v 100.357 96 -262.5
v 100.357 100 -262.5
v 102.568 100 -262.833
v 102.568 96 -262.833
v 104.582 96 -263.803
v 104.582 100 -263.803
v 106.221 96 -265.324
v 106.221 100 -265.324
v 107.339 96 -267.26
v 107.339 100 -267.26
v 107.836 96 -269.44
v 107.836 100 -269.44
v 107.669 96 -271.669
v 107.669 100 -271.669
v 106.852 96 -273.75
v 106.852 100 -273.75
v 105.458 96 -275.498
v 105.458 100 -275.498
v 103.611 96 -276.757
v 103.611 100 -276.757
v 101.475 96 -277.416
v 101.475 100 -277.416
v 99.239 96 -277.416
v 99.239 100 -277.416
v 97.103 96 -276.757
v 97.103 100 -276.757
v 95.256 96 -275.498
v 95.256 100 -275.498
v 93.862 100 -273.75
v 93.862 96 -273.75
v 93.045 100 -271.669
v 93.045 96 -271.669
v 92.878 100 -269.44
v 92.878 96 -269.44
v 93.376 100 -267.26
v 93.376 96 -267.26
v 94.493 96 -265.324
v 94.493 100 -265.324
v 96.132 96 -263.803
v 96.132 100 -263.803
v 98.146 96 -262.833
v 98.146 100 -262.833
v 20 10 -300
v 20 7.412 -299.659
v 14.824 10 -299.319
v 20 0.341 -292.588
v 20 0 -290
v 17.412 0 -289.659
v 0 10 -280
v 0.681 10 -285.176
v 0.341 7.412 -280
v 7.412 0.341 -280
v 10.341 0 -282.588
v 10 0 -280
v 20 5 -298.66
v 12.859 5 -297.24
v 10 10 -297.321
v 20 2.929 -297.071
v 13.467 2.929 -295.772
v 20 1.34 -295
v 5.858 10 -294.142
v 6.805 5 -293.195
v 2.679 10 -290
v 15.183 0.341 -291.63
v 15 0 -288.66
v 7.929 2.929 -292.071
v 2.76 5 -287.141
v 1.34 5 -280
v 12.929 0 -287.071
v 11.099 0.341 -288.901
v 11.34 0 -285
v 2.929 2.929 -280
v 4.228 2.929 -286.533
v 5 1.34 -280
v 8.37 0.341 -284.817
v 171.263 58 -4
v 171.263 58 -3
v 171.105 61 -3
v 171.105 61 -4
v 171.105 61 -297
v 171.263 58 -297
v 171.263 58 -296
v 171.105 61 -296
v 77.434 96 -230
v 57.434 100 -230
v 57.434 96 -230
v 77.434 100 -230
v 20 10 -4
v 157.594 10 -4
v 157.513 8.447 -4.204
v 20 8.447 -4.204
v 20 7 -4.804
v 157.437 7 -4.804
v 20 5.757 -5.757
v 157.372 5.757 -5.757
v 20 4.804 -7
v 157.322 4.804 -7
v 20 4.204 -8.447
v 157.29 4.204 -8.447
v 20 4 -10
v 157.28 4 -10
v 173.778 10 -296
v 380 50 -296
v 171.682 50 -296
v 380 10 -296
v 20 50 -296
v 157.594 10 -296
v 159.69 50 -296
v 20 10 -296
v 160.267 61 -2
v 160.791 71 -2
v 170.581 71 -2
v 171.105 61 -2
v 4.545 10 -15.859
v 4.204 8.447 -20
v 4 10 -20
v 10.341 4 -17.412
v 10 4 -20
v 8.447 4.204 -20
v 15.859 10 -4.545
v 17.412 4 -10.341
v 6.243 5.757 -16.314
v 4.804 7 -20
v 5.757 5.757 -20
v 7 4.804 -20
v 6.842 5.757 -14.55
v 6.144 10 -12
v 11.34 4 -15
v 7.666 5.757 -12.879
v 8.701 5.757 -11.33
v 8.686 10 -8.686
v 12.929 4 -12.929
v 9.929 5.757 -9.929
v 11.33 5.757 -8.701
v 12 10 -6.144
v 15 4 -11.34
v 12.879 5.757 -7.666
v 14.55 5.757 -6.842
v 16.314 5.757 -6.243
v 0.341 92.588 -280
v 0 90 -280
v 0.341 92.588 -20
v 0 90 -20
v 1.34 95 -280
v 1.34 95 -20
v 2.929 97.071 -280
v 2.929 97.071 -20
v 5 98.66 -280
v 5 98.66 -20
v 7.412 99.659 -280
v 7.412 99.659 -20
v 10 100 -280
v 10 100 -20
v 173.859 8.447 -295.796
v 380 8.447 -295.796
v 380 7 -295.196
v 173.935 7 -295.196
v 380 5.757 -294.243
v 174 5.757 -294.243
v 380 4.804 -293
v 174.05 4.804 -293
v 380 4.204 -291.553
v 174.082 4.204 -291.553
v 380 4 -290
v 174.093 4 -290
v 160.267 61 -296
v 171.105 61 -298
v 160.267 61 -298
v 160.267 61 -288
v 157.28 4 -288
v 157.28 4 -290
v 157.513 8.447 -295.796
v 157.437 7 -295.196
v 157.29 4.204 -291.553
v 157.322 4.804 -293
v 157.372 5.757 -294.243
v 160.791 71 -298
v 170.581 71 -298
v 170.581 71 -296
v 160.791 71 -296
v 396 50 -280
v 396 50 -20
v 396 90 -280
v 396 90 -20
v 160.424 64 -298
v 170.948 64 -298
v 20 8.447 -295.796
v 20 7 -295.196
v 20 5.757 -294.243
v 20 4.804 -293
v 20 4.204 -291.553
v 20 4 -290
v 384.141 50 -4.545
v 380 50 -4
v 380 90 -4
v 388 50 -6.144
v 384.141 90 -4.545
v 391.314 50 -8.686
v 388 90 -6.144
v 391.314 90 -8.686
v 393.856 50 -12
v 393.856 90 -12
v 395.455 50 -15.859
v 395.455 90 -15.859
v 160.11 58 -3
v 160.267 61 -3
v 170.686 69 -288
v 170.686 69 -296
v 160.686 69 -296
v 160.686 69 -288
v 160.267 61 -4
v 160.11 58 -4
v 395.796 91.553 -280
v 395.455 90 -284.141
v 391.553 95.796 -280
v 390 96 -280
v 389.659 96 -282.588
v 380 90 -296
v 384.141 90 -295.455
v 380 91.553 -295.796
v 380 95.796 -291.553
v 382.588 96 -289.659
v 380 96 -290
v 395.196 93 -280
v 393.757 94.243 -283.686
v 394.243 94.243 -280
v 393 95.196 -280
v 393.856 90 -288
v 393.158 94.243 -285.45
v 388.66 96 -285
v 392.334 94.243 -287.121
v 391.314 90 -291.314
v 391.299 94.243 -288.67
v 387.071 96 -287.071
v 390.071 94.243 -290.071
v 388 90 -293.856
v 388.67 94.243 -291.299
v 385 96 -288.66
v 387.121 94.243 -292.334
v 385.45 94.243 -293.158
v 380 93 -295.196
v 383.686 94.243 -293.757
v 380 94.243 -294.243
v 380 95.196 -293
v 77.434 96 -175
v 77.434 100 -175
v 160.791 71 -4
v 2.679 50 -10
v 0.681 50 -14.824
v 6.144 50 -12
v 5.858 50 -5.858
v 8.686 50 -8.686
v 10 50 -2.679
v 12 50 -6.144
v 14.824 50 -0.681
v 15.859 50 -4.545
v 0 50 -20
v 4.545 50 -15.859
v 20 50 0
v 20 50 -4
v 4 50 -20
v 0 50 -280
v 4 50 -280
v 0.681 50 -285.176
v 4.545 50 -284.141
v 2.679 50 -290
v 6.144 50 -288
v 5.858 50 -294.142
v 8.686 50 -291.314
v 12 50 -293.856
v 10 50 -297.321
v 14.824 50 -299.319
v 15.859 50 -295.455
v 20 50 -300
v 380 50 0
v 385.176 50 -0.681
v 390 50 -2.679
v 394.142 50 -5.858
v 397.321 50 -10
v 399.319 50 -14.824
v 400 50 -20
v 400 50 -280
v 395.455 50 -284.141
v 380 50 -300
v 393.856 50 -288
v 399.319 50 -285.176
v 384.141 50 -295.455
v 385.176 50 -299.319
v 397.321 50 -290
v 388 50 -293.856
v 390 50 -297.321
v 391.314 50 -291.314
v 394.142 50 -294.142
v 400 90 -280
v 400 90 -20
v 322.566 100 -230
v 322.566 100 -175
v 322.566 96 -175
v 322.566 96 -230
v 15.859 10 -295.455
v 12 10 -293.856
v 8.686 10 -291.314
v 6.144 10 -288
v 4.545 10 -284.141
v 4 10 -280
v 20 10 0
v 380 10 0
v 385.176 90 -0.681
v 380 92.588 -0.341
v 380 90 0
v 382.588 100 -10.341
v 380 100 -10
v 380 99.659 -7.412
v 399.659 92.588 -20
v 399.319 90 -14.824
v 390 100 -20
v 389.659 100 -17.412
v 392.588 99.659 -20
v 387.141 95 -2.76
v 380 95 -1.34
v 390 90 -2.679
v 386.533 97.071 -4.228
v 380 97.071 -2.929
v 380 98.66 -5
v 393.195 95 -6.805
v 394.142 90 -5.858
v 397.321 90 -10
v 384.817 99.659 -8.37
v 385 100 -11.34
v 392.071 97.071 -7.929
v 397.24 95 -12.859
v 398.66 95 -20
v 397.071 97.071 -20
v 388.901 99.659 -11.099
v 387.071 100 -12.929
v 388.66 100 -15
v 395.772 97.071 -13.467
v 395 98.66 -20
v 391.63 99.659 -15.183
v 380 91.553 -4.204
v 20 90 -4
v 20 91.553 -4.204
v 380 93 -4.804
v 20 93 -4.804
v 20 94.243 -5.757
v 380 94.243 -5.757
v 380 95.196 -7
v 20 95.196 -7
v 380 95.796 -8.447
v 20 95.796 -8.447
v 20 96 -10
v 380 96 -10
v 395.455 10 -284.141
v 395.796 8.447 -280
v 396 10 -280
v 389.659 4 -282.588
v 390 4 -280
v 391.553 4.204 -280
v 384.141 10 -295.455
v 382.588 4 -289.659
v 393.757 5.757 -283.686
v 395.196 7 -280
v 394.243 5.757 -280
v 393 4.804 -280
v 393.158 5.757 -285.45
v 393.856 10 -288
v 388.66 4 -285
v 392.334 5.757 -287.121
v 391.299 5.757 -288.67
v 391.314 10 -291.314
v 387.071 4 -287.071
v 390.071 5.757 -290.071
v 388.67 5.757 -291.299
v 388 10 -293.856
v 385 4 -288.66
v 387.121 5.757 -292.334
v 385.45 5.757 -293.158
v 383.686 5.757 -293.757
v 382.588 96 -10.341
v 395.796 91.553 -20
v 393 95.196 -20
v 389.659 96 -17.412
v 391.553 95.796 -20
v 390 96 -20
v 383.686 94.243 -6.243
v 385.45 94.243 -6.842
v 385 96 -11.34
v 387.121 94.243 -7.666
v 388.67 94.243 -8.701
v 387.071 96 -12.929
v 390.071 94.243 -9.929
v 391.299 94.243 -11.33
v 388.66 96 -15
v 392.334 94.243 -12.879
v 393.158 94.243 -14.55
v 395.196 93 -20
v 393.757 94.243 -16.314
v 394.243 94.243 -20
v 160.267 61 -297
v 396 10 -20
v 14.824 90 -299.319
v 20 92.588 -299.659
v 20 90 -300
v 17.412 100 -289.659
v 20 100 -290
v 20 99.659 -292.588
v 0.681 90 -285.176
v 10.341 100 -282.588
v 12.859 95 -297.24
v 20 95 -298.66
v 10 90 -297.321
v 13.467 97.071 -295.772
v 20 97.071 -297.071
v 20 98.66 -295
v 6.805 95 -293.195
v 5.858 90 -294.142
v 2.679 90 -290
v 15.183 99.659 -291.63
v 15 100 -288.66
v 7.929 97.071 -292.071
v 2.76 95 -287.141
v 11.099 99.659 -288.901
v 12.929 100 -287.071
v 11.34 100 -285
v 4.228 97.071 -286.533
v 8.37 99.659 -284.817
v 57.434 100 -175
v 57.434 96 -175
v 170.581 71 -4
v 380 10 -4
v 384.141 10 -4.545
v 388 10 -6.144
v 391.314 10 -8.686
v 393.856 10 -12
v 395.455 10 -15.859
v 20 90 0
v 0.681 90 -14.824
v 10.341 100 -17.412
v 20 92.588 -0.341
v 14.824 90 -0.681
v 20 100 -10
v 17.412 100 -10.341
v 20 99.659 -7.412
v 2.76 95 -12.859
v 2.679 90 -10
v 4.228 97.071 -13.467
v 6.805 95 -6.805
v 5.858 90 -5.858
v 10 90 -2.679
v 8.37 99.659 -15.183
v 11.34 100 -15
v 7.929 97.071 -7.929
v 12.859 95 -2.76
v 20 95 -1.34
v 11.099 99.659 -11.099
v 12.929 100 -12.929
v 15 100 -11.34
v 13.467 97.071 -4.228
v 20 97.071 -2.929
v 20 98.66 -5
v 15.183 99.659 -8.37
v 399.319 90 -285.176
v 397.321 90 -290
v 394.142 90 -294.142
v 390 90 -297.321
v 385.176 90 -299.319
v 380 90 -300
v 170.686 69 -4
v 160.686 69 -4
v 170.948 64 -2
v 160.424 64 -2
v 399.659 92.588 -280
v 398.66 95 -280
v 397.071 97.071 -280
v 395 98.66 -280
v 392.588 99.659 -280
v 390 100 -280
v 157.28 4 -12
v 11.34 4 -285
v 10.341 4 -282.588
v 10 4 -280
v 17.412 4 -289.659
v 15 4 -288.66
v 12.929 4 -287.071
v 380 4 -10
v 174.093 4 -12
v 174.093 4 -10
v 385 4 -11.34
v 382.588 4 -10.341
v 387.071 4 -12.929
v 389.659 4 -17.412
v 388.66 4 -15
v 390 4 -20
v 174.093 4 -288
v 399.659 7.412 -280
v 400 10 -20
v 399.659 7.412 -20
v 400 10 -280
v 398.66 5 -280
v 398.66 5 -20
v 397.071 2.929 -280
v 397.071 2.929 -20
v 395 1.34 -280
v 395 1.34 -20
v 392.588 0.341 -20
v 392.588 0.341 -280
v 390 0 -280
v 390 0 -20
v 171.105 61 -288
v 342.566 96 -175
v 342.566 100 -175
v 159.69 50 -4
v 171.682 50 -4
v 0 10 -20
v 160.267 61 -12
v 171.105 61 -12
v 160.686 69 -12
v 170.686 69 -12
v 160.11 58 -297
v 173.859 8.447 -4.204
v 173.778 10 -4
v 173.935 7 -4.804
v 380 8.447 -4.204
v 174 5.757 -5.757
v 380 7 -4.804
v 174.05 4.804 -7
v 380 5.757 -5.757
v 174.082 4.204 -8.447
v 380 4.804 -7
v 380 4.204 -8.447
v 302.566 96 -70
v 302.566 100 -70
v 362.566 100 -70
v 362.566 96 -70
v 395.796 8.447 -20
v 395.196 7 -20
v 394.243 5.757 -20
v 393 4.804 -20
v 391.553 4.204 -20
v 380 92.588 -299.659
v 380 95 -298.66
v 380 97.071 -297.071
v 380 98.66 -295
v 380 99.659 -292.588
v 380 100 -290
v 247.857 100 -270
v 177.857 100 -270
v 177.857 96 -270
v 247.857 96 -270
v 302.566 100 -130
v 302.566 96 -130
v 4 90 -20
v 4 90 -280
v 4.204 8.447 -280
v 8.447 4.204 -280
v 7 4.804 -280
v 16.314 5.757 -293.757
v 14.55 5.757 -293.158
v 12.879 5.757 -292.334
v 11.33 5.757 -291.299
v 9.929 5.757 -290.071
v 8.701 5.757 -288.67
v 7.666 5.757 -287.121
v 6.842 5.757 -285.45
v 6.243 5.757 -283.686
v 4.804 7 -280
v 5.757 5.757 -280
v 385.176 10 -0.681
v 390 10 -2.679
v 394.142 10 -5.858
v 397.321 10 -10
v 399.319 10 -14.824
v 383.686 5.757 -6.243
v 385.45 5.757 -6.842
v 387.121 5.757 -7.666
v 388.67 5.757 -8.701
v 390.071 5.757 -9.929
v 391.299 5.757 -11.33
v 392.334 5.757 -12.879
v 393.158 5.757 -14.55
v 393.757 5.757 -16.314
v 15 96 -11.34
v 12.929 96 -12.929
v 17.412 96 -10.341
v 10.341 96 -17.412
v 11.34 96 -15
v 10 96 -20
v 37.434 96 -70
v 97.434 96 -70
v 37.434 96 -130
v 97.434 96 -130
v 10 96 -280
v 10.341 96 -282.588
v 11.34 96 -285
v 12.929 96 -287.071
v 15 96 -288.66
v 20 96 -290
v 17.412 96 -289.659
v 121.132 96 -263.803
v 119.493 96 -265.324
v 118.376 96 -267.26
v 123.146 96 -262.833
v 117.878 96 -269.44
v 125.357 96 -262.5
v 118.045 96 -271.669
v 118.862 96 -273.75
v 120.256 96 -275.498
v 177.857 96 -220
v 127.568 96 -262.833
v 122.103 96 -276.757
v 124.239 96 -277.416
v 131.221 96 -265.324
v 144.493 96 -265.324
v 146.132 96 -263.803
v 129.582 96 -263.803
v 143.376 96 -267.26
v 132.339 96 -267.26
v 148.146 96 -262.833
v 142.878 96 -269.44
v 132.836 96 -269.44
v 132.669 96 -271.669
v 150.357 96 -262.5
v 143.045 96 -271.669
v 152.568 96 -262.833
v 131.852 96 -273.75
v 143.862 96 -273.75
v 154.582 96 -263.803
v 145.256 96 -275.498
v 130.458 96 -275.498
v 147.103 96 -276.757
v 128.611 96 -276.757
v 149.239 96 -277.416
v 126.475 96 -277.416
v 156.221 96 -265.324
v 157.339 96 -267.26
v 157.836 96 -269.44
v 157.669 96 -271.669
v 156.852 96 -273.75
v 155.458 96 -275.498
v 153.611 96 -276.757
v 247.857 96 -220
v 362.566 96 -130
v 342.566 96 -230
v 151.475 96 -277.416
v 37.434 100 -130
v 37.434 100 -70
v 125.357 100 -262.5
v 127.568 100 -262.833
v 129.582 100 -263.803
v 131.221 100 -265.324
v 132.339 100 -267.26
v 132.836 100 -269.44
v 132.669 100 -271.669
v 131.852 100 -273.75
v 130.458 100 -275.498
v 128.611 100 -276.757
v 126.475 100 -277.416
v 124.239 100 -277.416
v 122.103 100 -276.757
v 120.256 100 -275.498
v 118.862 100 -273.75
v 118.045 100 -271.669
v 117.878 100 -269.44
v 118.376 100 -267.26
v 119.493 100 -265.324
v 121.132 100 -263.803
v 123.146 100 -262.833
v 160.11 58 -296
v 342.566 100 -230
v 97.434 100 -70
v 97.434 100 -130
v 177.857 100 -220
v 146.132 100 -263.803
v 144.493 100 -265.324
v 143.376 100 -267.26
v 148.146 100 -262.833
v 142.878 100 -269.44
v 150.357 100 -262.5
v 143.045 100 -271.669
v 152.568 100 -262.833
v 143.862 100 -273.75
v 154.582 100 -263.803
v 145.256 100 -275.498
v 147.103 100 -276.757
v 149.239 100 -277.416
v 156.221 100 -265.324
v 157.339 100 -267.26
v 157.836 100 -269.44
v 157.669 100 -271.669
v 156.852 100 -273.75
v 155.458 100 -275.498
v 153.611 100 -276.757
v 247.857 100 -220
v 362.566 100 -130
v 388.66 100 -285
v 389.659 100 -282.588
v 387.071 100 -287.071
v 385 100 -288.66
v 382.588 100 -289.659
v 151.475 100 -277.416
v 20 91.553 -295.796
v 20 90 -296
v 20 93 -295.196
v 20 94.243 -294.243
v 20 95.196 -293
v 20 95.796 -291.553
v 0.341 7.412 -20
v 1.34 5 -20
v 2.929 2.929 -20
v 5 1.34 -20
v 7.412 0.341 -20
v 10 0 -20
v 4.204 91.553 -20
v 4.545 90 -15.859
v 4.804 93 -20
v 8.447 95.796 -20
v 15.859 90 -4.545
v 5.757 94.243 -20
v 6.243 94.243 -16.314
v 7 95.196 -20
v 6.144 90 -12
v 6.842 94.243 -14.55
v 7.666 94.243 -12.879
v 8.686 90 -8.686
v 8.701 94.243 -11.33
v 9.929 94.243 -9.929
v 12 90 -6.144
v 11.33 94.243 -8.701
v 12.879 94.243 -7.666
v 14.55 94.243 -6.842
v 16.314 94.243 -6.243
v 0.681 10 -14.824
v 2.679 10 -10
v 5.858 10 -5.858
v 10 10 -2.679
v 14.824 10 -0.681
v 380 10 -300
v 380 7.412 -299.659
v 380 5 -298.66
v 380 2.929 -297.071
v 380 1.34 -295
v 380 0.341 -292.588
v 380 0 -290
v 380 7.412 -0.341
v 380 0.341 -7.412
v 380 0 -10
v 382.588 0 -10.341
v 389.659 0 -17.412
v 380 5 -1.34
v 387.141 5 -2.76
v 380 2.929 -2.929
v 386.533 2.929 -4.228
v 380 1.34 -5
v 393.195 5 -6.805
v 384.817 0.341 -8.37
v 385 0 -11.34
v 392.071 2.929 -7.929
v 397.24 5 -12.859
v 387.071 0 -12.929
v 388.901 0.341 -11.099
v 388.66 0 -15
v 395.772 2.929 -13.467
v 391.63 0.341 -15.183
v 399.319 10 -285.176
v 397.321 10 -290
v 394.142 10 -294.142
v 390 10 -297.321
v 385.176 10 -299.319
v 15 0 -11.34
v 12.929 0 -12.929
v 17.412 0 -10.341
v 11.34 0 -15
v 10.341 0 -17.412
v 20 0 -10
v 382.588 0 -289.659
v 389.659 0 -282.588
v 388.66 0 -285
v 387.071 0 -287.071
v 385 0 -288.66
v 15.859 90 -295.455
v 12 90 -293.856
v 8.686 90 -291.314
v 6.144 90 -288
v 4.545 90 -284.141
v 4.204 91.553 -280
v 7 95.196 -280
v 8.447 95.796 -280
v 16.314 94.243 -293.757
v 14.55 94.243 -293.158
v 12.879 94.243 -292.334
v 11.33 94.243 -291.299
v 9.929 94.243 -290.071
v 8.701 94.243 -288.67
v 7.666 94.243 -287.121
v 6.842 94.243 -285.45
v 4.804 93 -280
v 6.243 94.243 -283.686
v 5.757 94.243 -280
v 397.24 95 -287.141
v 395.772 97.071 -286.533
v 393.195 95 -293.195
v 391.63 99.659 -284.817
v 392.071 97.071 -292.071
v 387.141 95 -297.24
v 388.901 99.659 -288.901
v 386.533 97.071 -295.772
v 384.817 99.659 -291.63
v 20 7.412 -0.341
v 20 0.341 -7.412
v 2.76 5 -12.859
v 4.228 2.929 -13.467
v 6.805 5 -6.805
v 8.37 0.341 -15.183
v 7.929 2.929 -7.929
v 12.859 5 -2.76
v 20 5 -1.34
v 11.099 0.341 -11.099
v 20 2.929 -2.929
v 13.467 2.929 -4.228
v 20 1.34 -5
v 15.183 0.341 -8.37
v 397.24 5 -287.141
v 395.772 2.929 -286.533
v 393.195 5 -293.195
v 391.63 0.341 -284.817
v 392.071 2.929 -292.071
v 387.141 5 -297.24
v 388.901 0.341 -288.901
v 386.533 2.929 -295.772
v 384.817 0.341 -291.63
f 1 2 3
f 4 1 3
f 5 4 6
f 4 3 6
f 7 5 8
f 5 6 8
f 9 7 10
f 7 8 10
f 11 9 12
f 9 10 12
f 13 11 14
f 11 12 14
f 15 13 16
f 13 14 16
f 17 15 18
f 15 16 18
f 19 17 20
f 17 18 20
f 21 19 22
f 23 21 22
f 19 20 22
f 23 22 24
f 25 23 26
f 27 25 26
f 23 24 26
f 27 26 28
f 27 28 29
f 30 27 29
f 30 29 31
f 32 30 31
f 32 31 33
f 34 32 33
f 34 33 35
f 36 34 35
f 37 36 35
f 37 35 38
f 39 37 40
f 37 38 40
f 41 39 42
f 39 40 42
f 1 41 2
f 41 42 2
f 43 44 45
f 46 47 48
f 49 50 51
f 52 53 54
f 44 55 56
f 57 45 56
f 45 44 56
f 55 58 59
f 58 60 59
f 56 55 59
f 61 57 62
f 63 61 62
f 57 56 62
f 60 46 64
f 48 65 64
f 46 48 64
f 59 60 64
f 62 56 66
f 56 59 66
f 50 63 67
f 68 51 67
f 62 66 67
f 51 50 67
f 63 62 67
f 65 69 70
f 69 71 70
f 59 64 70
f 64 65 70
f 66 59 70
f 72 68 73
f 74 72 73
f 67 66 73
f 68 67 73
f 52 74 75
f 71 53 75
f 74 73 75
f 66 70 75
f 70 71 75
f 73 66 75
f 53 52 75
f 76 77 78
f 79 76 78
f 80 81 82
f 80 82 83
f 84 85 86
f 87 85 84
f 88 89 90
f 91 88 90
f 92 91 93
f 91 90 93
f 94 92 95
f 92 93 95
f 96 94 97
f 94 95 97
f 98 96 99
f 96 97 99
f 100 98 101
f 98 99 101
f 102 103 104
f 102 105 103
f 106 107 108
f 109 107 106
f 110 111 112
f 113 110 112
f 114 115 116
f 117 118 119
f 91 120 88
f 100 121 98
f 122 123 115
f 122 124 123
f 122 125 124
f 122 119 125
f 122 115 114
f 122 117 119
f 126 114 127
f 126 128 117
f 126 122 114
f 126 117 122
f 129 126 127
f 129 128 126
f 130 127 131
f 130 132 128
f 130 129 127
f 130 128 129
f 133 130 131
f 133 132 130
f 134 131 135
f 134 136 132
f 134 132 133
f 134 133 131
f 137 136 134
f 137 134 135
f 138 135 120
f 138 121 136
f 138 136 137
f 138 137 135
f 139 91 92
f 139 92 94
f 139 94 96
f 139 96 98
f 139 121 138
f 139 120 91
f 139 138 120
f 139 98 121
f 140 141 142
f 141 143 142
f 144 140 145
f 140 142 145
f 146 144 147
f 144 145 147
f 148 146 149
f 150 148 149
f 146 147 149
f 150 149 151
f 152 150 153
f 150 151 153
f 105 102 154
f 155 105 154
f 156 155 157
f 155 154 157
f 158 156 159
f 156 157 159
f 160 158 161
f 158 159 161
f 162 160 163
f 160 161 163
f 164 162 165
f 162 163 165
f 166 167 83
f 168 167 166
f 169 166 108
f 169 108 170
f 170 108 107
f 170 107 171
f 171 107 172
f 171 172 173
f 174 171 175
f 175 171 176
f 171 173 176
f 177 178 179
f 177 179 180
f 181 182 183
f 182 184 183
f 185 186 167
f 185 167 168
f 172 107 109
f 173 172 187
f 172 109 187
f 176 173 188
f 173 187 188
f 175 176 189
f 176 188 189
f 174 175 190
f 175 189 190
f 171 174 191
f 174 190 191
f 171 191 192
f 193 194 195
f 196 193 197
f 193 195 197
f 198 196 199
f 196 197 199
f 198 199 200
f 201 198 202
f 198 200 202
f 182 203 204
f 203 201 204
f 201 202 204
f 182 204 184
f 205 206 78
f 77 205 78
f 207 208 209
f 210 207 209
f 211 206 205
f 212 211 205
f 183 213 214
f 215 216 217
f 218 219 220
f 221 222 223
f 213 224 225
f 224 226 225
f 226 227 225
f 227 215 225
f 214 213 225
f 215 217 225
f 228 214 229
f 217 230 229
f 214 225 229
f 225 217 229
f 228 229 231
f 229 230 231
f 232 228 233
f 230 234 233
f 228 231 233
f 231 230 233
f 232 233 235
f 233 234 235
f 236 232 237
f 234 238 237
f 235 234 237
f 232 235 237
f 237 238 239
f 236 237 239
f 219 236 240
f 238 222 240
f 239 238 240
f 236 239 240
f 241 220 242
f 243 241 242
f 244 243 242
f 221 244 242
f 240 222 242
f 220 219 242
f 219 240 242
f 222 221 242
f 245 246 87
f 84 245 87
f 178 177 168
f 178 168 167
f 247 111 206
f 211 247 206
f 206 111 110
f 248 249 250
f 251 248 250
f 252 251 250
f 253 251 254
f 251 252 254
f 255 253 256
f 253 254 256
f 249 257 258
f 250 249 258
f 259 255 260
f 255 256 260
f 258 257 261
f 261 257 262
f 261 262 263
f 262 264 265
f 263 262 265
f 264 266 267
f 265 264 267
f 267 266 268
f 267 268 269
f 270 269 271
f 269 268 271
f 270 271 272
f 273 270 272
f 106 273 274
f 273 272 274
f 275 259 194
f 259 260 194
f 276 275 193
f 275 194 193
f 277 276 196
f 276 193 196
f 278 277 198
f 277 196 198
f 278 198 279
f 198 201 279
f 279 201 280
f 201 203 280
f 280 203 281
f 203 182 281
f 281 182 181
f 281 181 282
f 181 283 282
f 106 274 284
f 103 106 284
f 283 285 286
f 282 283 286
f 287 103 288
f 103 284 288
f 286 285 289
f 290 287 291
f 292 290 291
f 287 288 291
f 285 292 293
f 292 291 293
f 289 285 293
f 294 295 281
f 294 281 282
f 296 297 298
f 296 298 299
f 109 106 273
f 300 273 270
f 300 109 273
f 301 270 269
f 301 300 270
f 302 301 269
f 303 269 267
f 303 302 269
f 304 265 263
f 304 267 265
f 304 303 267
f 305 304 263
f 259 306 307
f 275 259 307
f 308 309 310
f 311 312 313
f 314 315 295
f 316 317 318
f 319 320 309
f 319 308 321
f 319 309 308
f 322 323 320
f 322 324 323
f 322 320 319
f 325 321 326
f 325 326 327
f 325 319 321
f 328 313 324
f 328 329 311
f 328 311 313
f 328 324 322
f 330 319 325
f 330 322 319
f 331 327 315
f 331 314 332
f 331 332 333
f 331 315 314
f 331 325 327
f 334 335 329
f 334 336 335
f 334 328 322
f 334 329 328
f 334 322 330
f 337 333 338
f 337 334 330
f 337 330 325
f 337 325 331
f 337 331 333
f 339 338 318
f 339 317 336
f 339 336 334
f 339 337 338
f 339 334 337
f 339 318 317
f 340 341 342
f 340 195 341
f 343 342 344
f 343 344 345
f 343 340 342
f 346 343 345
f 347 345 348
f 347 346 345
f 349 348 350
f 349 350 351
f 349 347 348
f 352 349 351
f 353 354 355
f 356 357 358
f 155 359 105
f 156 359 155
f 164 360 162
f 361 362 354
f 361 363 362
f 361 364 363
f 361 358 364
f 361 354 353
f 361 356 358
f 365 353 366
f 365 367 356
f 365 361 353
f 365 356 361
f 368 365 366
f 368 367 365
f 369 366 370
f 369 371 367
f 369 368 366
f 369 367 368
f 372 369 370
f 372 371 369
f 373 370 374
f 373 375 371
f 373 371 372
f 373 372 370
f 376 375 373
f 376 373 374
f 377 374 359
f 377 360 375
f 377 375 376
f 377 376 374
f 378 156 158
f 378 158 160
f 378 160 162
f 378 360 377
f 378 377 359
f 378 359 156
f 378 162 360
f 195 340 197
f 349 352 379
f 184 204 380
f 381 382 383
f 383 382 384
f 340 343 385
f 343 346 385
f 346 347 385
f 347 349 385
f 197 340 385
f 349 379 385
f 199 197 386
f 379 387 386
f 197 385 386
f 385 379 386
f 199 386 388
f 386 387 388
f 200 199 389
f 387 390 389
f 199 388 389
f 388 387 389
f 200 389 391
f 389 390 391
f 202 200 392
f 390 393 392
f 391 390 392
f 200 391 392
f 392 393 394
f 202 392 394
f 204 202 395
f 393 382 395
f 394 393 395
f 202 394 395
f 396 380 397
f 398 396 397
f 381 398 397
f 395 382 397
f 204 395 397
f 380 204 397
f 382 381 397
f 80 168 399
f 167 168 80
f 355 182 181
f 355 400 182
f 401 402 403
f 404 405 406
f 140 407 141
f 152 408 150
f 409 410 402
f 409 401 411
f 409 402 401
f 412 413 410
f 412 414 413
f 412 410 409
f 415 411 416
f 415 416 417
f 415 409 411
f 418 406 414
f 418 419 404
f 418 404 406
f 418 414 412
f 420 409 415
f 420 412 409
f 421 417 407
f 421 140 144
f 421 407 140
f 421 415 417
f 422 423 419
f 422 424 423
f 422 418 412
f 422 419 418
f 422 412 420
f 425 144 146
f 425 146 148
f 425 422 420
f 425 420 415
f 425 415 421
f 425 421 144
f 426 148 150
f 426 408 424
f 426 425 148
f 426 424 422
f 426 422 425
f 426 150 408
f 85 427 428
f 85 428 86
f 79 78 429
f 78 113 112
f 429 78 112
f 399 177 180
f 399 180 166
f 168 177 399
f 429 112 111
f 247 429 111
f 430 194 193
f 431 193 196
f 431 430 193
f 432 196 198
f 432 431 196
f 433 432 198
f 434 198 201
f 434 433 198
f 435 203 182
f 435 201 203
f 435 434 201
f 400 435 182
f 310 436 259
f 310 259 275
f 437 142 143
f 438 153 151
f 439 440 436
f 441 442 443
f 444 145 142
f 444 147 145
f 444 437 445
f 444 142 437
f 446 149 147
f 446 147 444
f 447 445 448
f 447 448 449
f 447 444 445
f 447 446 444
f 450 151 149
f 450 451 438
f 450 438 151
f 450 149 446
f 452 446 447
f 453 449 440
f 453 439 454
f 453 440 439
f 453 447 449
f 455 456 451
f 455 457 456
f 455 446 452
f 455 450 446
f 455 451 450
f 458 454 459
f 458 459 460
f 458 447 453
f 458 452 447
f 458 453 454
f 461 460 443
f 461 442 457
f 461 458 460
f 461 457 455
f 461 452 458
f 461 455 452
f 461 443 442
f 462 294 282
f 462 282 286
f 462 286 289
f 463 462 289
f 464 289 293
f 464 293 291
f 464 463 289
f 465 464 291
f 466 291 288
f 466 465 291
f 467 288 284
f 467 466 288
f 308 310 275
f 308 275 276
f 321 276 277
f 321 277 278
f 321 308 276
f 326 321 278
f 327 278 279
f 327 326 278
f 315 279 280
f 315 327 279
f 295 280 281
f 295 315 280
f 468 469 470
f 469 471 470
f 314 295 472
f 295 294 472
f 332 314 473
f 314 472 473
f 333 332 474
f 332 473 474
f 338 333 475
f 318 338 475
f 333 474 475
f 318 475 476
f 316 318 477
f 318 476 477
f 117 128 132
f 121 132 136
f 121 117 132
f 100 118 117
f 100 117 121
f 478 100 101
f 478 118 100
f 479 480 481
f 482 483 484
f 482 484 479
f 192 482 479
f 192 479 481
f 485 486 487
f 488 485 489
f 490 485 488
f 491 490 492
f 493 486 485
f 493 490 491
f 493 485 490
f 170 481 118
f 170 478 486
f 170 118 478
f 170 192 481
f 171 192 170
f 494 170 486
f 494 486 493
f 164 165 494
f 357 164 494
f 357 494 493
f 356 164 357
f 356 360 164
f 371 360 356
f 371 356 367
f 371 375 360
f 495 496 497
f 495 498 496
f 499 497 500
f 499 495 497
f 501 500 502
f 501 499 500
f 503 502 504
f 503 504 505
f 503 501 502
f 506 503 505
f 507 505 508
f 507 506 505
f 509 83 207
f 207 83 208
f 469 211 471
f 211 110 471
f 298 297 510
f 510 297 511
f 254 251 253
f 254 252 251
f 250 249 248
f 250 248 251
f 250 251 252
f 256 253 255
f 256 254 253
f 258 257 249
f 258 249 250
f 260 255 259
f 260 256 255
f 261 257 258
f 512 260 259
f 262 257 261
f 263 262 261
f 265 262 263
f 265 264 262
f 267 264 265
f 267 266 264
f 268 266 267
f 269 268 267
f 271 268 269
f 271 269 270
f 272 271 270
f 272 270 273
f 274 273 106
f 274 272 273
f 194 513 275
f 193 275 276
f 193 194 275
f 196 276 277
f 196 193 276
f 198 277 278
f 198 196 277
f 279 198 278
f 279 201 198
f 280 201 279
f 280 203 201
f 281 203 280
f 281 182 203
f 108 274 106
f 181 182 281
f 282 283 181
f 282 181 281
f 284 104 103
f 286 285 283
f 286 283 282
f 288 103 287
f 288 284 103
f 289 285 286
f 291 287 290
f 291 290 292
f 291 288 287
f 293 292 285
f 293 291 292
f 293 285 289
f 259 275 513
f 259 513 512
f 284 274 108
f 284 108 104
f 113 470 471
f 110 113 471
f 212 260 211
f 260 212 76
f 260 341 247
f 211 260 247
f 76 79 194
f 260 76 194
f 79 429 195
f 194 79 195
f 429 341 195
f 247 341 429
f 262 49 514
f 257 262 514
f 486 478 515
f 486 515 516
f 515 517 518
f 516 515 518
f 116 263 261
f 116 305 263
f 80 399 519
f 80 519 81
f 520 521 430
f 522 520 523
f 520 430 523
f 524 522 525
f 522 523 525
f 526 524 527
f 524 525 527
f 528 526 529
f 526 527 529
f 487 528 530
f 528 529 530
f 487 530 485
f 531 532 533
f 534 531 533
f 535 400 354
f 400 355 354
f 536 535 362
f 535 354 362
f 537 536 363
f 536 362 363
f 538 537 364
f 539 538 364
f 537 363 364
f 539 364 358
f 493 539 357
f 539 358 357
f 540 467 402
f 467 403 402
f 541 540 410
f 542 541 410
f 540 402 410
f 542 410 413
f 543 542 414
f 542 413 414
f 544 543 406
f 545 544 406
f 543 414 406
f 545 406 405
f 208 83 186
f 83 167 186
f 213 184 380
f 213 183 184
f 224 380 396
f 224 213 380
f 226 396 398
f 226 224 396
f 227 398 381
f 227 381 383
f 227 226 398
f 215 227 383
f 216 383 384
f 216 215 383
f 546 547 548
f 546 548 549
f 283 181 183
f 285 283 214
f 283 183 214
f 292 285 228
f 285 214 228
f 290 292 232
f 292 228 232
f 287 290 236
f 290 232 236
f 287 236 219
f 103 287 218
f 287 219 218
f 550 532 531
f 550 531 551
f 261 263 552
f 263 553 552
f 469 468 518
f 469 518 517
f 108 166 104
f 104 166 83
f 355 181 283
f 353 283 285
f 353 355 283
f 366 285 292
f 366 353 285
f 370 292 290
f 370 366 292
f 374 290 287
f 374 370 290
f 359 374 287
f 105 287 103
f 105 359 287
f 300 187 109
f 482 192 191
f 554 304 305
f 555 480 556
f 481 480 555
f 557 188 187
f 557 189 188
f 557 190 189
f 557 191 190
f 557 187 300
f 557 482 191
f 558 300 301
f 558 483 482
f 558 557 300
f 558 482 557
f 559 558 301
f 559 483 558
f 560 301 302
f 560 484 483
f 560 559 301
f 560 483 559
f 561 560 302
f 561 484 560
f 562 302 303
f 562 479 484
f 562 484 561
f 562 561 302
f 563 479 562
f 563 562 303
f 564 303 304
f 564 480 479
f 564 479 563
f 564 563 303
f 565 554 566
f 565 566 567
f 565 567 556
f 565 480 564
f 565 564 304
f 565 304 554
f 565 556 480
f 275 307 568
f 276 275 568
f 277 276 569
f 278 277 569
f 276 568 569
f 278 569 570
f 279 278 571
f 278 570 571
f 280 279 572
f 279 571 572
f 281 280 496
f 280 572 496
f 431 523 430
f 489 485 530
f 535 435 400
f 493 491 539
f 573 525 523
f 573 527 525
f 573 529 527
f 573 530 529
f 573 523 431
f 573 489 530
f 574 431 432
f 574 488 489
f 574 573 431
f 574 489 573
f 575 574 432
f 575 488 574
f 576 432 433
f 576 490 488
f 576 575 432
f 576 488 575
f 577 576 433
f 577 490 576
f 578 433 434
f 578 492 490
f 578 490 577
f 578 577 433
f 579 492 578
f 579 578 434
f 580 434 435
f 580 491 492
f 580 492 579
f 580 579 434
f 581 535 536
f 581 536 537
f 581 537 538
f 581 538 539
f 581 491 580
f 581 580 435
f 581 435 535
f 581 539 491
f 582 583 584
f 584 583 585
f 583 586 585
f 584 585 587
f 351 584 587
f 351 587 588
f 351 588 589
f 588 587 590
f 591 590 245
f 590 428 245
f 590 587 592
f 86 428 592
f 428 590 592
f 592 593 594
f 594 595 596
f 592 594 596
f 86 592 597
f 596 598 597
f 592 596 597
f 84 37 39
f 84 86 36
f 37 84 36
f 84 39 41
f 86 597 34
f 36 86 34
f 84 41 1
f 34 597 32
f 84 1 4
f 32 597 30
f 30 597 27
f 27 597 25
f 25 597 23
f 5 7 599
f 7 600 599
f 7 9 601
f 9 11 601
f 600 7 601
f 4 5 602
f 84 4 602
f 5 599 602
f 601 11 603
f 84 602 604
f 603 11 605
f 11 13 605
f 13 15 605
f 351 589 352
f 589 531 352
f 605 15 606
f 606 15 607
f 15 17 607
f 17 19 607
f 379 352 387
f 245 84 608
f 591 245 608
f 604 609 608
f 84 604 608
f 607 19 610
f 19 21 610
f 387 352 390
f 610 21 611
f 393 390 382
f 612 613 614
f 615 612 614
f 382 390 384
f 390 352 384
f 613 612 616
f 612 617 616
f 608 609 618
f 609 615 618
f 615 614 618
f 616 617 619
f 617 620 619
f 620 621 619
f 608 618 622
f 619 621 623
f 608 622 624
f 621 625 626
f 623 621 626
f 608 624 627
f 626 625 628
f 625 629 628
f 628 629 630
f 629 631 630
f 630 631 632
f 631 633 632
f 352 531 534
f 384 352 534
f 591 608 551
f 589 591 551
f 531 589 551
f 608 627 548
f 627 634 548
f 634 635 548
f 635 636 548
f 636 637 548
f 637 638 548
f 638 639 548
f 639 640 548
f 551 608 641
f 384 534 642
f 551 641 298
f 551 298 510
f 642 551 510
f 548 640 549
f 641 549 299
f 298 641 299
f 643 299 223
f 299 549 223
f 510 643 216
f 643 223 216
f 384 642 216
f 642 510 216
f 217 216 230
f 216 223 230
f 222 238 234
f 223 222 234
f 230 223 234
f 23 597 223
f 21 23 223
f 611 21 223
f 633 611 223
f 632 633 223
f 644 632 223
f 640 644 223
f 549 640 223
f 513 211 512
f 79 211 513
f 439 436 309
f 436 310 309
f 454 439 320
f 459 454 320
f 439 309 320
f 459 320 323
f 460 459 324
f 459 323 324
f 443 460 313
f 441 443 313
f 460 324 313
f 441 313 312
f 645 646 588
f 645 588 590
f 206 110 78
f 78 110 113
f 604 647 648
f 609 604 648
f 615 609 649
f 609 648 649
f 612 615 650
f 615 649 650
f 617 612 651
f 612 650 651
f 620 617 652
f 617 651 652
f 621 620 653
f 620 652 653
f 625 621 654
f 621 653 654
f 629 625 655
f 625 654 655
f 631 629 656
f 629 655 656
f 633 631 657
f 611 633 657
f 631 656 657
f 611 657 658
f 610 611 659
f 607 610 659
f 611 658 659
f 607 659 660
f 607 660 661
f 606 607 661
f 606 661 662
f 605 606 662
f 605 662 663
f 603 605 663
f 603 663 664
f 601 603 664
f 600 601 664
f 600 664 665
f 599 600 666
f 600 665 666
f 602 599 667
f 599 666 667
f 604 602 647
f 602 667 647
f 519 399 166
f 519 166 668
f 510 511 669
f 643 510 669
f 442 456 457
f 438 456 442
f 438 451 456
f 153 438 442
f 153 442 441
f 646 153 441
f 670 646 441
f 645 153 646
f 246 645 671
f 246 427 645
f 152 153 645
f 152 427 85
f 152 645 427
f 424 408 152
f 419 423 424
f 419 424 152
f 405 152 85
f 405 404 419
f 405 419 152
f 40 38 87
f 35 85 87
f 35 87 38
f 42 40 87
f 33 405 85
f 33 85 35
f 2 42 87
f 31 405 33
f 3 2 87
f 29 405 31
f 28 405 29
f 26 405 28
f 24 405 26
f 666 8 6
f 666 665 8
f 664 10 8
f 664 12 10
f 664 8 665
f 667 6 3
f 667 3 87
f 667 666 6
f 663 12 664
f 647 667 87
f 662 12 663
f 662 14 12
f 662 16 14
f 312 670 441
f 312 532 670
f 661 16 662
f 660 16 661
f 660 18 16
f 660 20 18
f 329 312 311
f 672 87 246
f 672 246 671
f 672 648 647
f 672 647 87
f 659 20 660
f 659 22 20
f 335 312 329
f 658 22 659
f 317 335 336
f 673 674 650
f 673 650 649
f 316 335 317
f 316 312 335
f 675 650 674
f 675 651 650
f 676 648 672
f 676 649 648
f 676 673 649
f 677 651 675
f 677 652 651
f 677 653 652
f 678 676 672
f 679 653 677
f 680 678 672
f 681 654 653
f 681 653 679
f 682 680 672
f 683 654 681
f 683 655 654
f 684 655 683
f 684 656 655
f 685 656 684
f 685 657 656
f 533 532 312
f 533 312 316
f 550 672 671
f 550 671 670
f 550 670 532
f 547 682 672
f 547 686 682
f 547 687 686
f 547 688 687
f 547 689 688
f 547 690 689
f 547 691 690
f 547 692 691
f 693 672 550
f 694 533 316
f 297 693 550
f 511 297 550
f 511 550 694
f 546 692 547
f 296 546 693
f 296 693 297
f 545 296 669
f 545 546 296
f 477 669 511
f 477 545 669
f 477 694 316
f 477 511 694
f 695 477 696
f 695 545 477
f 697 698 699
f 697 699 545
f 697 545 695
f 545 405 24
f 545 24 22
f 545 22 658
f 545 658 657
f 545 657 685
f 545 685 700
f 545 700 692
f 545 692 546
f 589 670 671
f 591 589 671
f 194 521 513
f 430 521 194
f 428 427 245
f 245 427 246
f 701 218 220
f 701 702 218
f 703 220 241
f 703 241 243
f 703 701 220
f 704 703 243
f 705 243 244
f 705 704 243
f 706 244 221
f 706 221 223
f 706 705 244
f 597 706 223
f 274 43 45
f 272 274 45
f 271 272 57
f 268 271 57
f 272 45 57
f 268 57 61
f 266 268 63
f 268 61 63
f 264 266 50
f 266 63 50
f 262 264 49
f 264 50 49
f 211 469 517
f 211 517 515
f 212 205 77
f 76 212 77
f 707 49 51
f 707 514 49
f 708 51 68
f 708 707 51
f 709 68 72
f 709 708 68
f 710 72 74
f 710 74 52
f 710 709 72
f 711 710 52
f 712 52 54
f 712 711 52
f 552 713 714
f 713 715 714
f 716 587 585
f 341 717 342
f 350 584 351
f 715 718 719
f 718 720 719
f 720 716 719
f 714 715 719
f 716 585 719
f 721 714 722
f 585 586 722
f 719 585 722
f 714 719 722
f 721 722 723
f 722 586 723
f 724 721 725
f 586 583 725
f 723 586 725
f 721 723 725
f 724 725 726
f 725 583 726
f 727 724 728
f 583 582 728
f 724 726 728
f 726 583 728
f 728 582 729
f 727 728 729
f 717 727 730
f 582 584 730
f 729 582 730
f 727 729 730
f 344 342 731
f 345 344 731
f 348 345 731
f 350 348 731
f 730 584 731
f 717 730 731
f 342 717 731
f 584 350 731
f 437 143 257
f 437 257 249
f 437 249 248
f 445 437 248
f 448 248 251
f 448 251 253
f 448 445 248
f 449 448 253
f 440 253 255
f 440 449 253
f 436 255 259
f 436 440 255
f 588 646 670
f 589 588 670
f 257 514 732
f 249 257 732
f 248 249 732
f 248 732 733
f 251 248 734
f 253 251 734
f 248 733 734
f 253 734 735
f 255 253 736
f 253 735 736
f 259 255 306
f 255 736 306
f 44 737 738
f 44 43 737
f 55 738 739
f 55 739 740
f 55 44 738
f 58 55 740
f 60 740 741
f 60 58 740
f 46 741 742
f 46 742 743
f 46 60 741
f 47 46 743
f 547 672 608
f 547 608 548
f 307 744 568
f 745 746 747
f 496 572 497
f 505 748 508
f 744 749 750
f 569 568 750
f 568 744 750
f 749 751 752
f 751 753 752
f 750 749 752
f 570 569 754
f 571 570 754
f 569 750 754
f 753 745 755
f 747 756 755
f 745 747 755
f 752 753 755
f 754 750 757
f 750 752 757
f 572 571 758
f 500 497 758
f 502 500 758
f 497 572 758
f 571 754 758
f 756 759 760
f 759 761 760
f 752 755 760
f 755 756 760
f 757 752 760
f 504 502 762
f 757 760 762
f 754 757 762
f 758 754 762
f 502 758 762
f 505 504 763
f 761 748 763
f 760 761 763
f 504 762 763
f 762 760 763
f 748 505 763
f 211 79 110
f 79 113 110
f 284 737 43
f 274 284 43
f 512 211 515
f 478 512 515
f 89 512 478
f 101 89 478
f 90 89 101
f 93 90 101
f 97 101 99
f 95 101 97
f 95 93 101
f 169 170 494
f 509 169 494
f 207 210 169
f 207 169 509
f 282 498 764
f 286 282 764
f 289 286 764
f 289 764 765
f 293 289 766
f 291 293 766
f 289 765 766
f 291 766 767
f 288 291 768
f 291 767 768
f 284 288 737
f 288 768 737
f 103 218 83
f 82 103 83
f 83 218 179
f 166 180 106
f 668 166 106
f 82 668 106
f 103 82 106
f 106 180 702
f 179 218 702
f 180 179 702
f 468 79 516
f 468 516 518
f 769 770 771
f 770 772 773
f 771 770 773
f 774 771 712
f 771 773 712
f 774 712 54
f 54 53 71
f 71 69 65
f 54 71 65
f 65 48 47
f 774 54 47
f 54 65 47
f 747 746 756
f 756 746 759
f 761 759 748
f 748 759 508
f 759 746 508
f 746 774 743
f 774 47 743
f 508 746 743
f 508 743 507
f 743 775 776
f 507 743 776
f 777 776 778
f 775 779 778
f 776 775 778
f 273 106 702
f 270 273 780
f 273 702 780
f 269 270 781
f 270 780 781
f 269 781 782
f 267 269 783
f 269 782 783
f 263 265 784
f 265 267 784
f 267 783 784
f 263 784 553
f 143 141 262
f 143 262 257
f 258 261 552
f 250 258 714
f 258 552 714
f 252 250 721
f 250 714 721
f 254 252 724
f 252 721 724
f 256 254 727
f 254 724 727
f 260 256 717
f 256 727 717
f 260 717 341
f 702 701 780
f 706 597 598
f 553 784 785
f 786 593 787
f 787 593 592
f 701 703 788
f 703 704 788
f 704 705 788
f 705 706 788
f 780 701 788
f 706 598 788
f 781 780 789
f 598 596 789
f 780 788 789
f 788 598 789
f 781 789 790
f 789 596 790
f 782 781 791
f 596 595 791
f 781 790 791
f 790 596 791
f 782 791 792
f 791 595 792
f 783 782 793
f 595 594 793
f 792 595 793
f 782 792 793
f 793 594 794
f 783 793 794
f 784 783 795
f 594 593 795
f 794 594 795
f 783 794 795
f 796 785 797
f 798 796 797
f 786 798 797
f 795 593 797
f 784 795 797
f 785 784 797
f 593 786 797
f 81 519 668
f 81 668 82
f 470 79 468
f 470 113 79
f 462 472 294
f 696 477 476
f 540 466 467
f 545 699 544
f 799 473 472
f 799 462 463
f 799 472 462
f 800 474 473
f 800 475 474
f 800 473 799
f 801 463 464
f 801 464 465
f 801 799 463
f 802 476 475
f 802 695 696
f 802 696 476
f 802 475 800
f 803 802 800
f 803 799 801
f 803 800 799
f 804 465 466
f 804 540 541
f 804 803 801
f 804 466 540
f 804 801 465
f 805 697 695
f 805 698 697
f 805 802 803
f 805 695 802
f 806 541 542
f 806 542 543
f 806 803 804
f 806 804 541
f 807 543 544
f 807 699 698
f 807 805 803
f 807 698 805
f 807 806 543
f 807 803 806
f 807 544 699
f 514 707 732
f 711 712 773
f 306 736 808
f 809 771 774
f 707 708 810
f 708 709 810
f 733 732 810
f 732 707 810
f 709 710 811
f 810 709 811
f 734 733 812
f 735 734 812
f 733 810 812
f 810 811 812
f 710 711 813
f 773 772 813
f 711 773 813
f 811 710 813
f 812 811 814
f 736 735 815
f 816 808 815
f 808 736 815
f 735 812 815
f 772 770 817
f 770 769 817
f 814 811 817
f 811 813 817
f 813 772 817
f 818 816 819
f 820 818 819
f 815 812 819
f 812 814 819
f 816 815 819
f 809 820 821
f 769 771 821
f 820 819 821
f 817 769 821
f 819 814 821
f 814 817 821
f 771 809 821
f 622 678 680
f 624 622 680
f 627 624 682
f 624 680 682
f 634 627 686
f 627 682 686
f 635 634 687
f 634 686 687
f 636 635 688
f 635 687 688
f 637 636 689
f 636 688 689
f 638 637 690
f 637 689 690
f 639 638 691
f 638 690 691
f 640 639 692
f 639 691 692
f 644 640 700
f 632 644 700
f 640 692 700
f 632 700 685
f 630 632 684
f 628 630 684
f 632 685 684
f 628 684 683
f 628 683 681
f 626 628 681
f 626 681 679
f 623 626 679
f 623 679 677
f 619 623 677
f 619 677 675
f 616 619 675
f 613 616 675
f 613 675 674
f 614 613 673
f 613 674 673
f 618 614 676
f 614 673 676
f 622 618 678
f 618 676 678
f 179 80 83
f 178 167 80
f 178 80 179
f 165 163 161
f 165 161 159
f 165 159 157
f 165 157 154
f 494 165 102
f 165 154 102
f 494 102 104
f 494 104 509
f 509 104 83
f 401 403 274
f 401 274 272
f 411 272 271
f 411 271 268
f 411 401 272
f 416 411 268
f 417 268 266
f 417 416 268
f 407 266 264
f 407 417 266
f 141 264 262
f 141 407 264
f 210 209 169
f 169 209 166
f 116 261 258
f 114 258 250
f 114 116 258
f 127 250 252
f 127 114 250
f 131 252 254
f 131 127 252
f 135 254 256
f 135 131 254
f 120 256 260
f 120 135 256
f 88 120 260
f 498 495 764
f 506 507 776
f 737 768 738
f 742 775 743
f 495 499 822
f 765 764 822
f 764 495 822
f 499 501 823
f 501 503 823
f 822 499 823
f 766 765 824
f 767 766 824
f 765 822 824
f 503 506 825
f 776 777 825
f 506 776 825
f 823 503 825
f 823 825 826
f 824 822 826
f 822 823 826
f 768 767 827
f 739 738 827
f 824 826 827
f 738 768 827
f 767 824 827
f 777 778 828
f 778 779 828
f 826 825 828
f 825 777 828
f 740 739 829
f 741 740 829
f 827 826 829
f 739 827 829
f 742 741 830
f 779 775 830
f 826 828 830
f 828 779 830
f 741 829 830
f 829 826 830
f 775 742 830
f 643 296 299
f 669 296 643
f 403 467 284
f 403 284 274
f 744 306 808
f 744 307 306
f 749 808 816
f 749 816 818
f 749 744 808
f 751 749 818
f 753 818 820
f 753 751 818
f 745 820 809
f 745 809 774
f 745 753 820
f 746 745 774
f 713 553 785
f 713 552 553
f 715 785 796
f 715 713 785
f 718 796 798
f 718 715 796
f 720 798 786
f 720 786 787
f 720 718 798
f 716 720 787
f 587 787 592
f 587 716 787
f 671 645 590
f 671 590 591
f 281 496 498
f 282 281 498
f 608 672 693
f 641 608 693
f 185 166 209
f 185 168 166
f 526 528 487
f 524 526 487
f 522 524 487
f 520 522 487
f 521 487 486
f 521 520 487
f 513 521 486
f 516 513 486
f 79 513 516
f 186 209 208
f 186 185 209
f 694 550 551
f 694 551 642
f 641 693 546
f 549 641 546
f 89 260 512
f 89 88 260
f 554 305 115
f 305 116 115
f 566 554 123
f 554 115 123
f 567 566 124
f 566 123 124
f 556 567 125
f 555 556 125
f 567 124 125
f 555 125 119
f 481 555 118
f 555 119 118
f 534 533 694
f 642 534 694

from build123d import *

# Parameters (mm, degrees)
BOSS_EXTRUDE1_DEPTH  = 50
FILLET1_R            = 10
SHELL1_T             = -4
SNAP_START           = -296
SNAP_HOOK1_DEPTH     = 8
SNAP_HOOK1_2_DEPTH   = 8
SNAP_START_2         = -298
SNAP_GROOVE1_DEPTH   = 3
SNAP_START_3         = -297
SNAP_GROOVE1_2_DEPTH = 2
SKETCH6_R            = 7.5
SKETCH6_W            = 70
SKETCH6_H            = 50
CUT_EXTRUDE1_DEPTH   = 4
SKETCH4_W            = 60
SKETCH4_H            = 60
SKETCH4_W_2          = 20
SKETCH4_H_2          = 55
CUT_EXTRUDE2_DEPTH   = 4


with BuildPart() as part:
    # Sketch1 → Boss-Extrude1 (new body)
    with BuildSketch(Plane(origin=(0, 0, 0), x_dir=(1, 0, 0), z_dir=(0, 1, 0))):
        with BuildLine():
            Line((20, 0), (380, 0))
            ThreePointArc((380, 0), (394.142135624, 5.857864376), (400, 20))
            Line((400, 20), (400, 280))
            ThreePointArc((400, 280), (394.142135624, 294.142135624), (380, 300))
            Line((380, 300), (20, 300))
            ThreePointArc((20, 300), (5.857864376, 294.142135624), (0, 280))
            Line((0, 280), (0, 20))
            ThreePointArc((0, 20), (5.857864376, 5.857864376), (20, 0))
        make_face()
    extrude(amount=BOSS_EXTRUDE1_DEPTH)

    # Fillet1
    fillet1_edges = [part.edges().sort_by_distance(p)[0] for p in [
        (200, 0, 0),
        (5.857864376, 0, -5.857864376),
        (0, 0, -150),
        (5.857864376, 0, -294.142135624),
        (200, 0, -300),
        (394.142135624, 0, -294.142135624),
        (400, 0, -150),
        (394.142135624, 0, -5.857864376),
    ]]
    fillet(fillet1_edges, radius=FILLET1_R)

    # Shell1
    shell1_openings = [part.faces().sort_by_distance(p)[0] for p in [
        (200, 50, -150),
    ]]
    offset(amount=SHELL1_T, openings=shell1_openings, kind=Kind.INTERSECTION)


with BuildPart() as body_2:
    # Mirror1: mirrored copy
    add(part.part.mirror(Plane(origin=(20, 50, -280), x_dir=(0, 0, 1), z_dir=(0, -1, 0))))

    # Snap Groove1: read off the stored shape, not the designer's step
    # Snap Groove1 outline → Snap Groove1 (cut)
    with BuildSketch(Plane.XY.offset(SNAP_START_2)):
        Polygon((160.790835622, 71), (160.26675783, 61), (171.105282298, 61), (170.581204505, 71), align=None)
    snap_groove1 = extrude(amount=SNAP_GROOVE1_DEPTH, mode=Mode.SUBTRACT)

    # Snap Groove1 2 outline → Snap Groove1 2 (cut)
    with BuildSketch(Plane.XY.offset(SNAP_START_3)):
        Polygon((171.105282298, 61), (160.266757829, 61), (160.109534492, 58), (171.262505636, 58), align=None)
    snap_groove1_2 = extrude(amount=SNAP_GROOVE1_2_DEPTH, mode=Mode.SUBTRACT)

    # Mirror4: Snap Groove1, Snap Groove1 2 across plane
    add(snap_groove1.mirror(Plane.XY.offset(-150)), mode=Mode.SUBTRACT)
    add(snap_groove1_2.mirror(Plane.XY.offset(-150)), mode=Mode.SUBTRACT)

    # Sketch6 → Cut-Extrude1 (cut)
    with BuildSketch(Plane(origin=(0, 100, 0), x_dir=(1, 0, 0), z_dir=(0, 1, 0))):
        with Locations(Location((150.357112629, 270, 0), (0, 0, 270))):
            Circle(SKETCH6_R)
        with Locations(Location((125.357112629, 270, 0), (0, 0, 270))):
            Circle(SKETCH6_R)
        with Locations(Location((100.357112629, 270, 0), (0, 0, 270))):
            Circle(SKETCH6_R)
        with Locations((212.857112629, 245)):
            Rectangle(SKETCH6_W, SKETCH6_H)
    extrude(amount=-CUT_EXTRUDE1_DEPTH, mode=Mode.SUBTRACT)

    # Sketch4 → Cut-Extrude2 (cut)
    with BuildSketch(Plane(origin=(0, 100, 0), x_dir=(1, 0, 0), z_dir=(0, 1, 0))):
        with Locations((332.566341506, 100)):
            Rectangle(SKETCH4_W, SKETCH4_H)
        with Locations((332.566341506, 202.5)):
            Rectangle(SKETCH4_W_2, SKETCH4_H_2)
        with Locations((67.433658494, 100)):
            Rectangle(SKETCH4_W, SKETCH4_H)
        with Locations((67.433658494, 202.5)):
            Rectangle(SKETCH4_W_2, SKETCH4_H_2)
    extrude(amount=-CUT_EXTRUDE2_DEPTH, mode=Mode.SUBTRACT)


with BuildPart() as part_1:
    add(part.part)

    # Snap Hook1: read off the stored shape, not the designer's step
    # Snap Hook1 outline → Snap Hook1 (add)
    with BuildSketch(Plane.XY.offset(SNAP_START)):
        Polygon((171.105282298, 61), (170.686020064, 69), (160.686020064, 69), (160.26675783, 61), align=None)
    snap_hook1 = extrude(amount=SNAP_HOOK1_DEPTH)

    # Snap Hook1 2 outline → Snap Hook1 2 (add)
    with BuildSketch(Plane.XY.offset(SNAP_START)):
        Polygon((171.105282298, 61), (160.266757829, 61), (157.27951441, 4), (174.092525717, 4), align=None)
    snap_hook1_2 = extrude(amount=SNAP_HOOK1_2_DEPTH)

    # Snap Hook1 3: loft between two sections, ruled curve by curve
    snap_hook1_3_from = [
        Edge.make_line((160.686020064, 69, -296), (170.686020064, 69, -296)),
        Edge.make_line((171.105282298, 61, -296), (160.266757829, 61, -296)),
        Edge.make_line((171.105282298, 61, -296), (170.686020064, 69, -296)),
        Edge.make_line((160.266757829, 61, -296), (160.686020064, 69, -296)),
    ]
    snap_hook1_3_to = [
        Edge.make_line((160.423981167, 64, -298), (170.94805896, 64, -298)),
        Edge.make_line((171.105282298, 61, -298), (160.266757829, 61, -298)),
        Edge.make_line((171.105282298, 61, -298), (170.94805896, 64, -298)),
        Edge.make_line((160.266757829, 61, -298), (160.423981167, 64, -298)),
    ]
    snap_hook1_3 = Solid(Shell([*[Face.make_surface_from_curves(snap_hook1_3_from[k], snap_hook1_3_to[k]) for k in range(4)], Face(Wire(snap_hook1_3_from)), Face(Wire(snap_hook1_3_to))]))
    add(snap_hook1_3)

    # Mirror3: Snap Hook1, Snap Hook1 2, Snap Hook1 3 across plane
    add(snap_hook1.mirror(Plane.XY.offset(-150)))
    add(snap_hook1_2.mirror(Plane.XY.offset(-150)))
    add(snap_hook1_3.mirror(Plane.XY.offset(-150)))


solid = Compound([body_2.part, part_1.part])
